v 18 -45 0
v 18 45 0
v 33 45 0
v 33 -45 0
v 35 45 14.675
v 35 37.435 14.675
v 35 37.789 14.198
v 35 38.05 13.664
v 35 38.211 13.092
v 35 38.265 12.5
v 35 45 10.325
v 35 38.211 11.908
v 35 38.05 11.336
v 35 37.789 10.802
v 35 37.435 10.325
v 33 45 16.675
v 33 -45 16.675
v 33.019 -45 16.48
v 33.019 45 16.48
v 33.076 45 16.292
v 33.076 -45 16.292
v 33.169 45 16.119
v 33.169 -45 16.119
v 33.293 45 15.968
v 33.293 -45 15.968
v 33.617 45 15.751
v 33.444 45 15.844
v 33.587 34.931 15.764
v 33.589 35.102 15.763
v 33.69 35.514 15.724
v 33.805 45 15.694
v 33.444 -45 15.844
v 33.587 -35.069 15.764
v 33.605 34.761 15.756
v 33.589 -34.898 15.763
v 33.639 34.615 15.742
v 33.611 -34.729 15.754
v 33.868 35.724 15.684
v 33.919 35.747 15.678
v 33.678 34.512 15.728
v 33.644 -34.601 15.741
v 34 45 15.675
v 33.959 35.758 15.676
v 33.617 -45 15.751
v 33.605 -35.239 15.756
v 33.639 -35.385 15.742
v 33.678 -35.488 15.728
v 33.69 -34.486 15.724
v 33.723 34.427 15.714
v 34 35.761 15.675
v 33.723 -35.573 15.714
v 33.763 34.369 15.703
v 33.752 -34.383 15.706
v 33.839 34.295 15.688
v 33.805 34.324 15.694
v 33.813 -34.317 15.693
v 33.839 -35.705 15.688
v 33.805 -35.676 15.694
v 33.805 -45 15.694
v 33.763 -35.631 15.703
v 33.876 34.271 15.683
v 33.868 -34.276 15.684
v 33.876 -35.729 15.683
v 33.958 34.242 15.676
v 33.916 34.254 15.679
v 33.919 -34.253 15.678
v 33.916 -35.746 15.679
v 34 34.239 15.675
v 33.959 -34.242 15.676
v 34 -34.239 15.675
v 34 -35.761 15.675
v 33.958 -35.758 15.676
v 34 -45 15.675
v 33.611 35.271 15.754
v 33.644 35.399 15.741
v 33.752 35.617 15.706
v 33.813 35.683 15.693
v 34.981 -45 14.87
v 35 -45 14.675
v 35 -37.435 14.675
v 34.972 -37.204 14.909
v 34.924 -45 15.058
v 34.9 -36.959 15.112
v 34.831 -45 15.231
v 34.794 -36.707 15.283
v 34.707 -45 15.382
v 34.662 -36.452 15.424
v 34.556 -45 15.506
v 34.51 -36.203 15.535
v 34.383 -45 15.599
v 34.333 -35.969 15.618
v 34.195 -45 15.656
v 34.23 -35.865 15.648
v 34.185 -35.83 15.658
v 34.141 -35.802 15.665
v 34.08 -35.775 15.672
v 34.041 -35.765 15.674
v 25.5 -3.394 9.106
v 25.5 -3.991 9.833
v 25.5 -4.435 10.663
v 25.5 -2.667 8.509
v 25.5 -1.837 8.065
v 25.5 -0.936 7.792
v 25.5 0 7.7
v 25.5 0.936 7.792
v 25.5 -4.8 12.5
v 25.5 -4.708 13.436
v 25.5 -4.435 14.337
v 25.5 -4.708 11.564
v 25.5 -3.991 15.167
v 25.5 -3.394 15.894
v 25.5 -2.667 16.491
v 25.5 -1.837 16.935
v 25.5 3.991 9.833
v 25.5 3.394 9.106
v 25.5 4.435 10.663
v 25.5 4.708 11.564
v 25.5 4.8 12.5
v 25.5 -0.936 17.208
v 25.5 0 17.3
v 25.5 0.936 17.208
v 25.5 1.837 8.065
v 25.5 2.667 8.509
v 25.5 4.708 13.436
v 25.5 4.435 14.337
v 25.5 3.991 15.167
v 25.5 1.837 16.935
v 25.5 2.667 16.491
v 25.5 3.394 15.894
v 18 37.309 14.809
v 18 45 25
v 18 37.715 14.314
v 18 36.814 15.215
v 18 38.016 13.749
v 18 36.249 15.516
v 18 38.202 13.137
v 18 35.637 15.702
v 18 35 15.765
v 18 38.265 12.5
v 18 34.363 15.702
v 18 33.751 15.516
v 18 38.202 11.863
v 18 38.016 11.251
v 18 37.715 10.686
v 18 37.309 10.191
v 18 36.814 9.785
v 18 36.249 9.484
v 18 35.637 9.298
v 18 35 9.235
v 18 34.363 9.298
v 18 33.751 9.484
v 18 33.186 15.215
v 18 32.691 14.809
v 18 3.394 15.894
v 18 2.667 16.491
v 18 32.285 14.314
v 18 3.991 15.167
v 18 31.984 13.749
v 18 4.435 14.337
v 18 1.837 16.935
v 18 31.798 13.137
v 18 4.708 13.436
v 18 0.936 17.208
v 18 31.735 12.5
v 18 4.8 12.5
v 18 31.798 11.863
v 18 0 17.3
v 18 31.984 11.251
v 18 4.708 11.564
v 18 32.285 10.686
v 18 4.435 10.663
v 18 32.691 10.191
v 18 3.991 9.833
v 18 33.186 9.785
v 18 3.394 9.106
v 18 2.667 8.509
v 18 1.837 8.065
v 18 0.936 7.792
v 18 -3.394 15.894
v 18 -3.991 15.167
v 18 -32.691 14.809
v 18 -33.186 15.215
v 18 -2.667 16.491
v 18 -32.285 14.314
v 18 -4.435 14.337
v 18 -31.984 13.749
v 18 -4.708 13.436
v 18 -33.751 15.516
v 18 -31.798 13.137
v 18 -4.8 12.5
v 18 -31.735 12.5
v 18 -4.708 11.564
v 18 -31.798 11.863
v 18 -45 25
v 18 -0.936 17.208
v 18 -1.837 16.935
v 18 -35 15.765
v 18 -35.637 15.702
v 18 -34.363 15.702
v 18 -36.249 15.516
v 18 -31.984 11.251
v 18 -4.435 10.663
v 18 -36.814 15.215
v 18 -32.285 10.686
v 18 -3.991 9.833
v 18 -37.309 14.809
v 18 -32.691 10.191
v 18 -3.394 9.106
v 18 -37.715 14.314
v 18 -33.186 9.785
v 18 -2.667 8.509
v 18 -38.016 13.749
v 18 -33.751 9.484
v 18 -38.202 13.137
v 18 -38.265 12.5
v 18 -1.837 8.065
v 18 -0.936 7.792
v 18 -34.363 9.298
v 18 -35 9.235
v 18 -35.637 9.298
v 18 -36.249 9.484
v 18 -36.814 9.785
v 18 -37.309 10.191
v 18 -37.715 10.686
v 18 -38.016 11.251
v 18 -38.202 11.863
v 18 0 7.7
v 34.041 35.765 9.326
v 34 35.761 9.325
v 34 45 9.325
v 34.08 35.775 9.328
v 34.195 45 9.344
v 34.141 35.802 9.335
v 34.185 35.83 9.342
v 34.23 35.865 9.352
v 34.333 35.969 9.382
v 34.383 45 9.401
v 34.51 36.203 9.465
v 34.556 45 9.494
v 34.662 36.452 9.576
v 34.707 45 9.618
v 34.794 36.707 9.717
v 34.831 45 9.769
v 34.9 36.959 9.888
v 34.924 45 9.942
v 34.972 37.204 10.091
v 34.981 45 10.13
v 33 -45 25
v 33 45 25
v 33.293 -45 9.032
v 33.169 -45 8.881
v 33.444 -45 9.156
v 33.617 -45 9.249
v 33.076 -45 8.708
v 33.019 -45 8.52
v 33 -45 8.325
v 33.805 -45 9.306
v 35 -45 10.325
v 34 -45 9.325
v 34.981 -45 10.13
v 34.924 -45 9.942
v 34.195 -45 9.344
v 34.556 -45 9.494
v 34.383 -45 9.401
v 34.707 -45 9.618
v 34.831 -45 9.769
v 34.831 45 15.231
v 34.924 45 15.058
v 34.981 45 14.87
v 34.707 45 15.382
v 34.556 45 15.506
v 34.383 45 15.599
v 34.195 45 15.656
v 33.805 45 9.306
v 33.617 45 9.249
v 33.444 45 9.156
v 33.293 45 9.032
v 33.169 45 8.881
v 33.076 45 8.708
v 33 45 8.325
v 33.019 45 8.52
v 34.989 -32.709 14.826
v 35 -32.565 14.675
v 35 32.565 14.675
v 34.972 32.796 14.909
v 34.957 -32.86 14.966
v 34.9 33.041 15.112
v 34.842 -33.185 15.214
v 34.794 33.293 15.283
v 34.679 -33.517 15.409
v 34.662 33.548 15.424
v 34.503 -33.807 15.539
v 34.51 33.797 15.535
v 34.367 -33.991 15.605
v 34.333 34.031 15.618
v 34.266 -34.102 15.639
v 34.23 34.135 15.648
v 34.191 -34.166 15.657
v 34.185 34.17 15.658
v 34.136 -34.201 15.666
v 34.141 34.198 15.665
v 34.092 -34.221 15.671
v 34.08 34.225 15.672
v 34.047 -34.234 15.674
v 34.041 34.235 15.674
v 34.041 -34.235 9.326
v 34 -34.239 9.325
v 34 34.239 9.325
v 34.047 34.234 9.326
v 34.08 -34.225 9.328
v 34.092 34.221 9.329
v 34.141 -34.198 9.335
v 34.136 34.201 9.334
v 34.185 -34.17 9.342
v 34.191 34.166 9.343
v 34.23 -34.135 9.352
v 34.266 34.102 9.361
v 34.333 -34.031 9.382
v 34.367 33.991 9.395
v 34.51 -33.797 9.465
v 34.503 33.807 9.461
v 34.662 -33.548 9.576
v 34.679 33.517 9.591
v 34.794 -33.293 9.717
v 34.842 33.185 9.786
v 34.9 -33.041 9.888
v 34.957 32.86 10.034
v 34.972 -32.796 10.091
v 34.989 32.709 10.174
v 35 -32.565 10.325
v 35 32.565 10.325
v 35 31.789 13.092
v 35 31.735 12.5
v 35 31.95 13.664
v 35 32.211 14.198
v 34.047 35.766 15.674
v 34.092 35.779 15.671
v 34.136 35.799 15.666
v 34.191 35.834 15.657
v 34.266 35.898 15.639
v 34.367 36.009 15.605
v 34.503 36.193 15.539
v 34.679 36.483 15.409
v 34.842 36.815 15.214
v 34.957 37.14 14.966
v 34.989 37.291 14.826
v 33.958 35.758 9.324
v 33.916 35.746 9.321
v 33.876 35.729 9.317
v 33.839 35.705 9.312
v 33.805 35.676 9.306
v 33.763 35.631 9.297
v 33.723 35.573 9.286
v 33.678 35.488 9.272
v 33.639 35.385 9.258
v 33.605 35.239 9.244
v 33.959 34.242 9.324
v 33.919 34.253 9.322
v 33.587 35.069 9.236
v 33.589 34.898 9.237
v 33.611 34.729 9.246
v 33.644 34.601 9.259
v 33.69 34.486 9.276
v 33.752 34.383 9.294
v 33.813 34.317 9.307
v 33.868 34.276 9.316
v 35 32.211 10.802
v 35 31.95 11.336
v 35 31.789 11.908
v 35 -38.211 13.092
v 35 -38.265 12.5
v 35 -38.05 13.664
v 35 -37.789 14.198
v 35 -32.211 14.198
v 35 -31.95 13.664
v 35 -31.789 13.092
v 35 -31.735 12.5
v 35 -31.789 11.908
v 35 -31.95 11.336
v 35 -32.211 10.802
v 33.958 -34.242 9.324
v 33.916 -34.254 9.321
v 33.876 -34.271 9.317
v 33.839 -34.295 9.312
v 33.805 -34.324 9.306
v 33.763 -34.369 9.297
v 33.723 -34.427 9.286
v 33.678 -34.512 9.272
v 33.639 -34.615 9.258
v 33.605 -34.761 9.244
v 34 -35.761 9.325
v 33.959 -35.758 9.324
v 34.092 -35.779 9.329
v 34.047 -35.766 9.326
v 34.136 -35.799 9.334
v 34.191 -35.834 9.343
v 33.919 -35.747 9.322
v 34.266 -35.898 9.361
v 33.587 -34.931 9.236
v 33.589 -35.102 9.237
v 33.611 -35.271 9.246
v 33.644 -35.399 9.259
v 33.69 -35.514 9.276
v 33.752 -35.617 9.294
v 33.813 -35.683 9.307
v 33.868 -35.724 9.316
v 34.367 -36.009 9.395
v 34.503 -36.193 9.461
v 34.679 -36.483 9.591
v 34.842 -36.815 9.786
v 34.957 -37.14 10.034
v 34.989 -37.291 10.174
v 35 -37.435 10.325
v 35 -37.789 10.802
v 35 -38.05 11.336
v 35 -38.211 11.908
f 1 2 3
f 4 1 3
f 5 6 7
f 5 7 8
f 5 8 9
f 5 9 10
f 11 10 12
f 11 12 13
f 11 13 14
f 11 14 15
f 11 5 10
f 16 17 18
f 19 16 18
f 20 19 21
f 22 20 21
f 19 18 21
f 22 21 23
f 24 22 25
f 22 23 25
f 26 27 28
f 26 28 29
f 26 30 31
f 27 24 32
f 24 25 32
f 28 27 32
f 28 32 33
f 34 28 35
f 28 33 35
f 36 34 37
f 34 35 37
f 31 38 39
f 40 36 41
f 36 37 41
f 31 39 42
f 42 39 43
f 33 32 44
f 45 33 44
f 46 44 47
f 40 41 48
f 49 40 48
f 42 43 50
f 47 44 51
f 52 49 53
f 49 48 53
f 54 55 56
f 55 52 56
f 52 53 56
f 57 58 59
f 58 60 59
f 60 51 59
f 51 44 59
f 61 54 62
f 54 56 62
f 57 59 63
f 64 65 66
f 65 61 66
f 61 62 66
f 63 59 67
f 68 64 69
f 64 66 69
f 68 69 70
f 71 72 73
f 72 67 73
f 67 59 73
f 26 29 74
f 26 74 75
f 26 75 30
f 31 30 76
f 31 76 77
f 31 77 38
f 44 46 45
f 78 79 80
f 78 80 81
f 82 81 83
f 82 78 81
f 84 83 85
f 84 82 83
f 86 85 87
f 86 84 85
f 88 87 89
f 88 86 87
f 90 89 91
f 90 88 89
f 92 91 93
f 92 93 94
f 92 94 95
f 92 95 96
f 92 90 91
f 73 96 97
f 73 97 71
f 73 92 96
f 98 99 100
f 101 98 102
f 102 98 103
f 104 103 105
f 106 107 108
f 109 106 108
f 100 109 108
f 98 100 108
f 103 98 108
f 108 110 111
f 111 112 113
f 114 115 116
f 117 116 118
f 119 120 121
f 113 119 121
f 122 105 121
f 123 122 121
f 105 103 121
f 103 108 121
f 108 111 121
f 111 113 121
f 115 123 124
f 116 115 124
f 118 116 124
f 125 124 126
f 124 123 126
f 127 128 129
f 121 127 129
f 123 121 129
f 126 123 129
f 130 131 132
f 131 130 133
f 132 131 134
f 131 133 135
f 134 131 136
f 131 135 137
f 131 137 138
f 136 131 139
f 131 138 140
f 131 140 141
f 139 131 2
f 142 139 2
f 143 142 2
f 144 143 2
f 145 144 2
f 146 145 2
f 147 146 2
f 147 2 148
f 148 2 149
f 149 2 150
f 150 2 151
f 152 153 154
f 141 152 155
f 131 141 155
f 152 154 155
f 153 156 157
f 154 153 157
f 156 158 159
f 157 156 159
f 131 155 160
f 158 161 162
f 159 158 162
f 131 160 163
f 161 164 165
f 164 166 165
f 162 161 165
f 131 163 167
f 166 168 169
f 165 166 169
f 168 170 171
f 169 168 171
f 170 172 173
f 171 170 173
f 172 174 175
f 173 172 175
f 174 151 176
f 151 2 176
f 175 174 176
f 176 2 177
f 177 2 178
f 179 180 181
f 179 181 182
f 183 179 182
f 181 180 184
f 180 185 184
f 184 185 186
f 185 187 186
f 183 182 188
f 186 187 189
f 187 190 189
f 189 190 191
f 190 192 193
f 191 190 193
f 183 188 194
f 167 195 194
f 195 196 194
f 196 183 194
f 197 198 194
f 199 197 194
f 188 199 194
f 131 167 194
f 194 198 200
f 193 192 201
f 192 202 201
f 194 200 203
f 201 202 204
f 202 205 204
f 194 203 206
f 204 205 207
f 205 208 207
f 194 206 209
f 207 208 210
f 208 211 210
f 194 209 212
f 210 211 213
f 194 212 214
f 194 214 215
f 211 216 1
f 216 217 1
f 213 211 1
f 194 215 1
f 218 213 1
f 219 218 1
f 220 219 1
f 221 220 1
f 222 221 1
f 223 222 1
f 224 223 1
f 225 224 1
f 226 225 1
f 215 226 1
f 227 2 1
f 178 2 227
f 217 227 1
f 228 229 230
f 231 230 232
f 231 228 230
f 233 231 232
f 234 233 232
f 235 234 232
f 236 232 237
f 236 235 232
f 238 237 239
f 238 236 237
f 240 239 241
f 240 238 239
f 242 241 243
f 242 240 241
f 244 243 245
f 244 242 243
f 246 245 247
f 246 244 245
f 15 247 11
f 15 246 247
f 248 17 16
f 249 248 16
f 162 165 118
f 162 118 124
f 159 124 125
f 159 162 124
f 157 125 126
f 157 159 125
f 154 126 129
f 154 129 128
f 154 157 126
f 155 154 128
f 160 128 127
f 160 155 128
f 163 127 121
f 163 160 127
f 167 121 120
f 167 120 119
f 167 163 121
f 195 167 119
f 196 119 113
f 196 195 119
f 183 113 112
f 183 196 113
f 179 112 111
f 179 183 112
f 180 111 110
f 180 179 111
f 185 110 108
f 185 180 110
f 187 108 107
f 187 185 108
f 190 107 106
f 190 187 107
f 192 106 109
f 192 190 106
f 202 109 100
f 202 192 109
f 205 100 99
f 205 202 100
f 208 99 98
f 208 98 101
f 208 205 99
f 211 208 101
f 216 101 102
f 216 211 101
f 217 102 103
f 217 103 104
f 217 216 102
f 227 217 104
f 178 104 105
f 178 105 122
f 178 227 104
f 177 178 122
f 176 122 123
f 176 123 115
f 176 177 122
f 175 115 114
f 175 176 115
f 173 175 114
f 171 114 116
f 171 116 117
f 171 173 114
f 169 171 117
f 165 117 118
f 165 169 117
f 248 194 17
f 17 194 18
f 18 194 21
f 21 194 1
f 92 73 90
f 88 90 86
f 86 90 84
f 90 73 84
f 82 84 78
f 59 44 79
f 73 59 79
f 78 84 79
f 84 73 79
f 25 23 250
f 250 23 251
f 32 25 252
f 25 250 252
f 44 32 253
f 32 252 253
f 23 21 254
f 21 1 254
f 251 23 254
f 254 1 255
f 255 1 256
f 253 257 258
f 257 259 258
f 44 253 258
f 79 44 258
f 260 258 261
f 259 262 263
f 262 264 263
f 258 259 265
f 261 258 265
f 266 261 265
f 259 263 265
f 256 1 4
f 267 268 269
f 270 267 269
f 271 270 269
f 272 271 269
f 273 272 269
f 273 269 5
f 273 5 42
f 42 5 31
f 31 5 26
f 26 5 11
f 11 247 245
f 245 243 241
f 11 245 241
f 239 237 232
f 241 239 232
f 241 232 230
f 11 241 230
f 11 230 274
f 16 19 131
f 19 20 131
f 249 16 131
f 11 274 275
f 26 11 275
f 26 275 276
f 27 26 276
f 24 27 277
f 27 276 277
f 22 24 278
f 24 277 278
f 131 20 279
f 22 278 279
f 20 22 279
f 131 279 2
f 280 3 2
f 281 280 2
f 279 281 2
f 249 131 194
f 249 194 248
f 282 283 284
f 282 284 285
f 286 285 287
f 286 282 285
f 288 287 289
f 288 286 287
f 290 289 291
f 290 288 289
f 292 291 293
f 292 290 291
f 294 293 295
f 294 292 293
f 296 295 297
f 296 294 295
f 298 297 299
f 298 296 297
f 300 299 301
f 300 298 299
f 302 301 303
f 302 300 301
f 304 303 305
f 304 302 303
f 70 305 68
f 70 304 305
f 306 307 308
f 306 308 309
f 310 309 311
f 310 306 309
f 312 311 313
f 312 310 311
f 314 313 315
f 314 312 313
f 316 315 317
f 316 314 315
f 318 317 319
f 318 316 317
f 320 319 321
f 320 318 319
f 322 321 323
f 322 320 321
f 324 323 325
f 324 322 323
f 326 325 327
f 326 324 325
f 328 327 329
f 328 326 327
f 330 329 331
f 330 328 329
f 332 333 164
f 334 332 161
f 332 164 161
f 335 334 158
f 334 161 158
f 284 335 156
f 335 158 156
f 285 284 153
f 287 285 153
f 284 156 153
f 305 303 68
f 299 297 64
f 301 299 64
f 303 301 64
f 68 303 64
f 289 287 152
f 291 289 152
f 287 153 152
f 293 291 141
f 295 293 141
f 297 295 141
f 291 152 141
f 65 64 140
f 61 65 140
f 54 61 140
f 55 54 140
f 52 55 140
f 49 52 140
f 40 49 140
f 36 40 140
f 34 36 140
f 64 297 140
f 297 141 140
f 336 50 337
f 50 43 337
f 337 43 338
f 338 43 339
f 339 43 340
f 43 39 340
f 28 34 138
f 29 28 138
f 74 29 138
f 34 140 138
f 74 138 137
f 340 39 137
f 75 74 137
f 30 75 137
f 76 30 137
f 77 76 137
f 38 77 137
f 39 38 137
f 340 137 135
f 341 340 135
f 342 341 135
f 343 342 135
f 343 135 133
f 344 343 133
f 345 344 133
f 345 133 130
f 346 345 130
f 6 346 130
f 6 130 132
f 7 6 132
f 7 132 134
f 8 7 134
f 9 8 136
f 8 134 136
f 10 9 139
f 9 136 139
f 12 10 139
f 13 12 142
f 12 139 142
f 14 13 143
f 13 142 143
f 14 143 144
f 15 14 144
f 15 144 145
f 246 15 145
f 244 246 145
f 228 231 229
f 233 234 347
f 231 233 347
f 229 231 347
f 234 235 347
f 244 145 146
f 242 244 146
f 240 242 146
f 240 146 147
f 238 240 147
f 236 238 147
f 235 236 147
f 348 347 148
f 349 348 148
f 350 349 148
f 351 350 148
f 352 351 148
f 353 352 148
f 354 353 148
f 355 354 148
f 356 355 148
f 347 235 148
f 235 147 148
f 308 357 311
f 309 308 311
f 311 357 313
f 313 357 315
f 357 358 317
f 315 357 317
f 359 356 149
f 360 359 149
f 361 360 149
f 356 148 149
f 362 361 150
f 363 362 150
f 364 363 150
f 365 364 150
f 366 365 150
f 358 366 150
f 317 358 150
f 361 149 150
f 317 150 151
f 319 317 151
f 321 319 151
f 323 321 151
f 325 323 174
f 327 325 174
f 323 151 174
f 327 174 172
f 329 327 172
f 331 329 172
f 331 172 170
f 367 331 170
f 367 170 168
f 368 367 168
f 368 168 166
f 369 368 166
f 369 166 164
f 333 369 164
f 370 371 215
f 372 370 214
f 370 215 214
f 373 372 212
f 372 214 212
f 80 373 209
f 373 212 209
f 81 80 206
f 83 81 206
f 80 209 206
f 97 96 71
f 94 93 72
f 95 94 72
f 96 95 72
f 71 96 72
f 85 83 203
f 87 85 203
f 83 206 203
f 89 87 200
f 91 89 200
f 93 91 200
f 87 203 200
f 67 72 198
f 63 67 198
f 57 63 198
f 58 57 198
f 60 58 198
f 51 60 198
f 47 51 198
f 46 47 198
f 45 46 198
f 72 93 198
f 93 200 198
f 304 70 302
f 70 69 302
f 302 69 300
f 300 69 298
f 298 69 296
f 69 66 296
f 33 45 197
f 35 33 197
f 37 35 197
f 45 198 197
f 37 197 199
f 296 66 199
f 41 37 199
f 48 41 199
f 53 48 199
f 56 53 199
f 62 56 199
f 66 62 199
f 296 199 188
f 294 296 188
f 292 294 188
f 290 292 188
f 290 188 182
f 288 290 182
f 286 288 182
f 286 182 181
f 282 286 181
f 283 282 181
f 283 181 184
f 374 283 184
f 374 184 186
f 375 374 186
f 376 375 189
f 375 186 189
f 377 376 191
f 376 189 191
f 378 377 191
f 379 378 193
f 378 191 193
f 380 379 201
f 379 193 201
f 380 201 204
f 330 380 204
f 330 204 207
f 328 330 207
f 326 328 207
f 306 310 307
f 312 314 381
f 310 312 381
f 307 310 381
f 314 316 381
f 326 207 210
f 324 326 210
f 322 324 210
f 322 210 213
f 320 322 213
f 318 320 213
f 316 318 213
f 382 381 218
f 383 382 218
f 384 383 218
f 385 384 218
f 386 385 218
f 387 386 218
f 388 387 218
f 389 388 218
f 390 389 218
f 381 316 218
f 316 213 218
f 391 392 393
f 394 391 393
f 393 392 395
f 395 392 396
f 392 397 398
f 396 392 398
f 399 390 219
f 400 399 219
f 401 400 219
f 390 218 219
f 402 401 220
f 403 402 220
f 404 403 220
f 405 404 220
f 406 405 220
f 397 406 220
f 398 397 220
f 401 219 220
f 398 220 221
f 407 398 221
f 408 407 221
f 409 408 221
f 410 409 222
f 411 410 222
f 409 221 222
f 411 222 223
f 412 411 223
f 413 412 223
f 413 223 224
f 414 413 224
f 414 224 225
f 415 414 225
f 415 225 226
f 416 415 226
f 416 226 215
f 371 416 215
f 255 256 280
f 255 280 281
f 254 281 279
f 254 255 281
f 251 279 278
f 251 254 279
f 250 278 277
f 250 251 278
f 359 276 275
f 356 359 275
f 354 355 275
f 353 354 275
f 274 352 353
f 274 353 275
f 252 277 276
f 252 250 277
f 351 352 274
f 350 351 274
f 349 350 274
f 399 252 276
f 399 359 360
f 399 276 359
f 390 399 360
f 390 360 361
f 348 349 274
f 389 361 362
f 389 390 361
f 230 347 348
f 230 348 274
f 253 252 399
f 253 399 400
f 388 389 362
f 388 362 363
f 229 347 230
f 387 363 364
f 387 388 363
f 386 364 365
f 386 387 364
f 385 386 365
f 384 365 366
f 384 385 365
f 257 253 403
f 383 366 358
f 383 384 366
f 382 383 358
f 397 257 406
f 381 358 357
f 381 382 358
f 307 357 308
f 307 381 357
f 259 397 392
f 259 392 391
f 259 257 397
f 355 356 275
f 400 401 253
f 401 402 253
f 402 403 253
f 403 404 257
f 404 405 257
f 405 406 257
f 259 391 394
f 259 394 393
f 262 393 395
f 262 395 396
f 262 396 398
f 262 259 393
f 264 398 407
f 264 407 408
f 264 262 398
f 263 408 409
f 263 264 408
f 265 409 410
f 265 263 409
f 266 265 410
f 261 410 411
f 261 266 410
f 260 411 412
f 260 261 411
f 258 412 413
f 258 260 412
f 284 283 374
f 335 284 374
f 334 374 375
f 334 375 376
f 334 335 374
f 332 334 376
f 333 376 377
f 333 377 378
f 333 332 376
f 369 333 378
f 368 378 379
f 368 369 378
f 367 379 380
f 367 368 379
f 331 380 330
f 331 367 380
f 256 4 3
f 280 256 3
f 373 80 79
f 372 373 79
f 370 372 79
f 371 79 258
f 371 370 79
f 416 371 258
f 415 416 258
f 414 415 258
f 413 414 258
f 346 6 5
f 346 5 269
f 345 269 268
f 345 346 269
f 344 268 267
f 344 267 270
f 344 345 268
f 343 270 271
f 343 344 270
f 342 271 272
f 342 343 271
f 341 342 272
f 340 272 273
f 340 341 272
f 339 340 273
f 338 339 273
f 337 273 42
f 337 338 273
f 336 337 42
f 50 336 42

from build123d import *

# Parameters (mm, degrees)
BOSS_EXTRUDE1_DEPTH = 25
SKETCH3_R           = 4.8
CUT_EXTRUDE1_DEPTH  = 7.5
SKETCH6_W           = 2
SKETCH6_H           = 6.35
BOSS_EXTRUDE2_DEPTH = 90
FILLET2_R           = 1
SKETCH7_R           = 3.265
CUT_EXTRUDE2_DEPTH  = 55.212544674


with BuildPart() as part:
    # Sketch2 → Boss-Extrude1 (new body)
    with BuildSketch(Plane.XY):
        Polygon((18, 45), (18, 25), (18, -25), (18, -45), (33, -45), (33, 45), align=None)
    extrude(amount=BOSS_EXTRUDE1_DEPTH)

    # Sketch3 → Cut-Extrude1 (cut)
    with BuildSketch(Plane(origin=(18, 0, 0), x_dir=(0, 0, -1), z_dir=(1, 0, 0))):
        with Locations(Location((-12.5, 0, 0), (0, 0, 90))):
            Circle(SKETCH3_R)
    extrude(amount=CUT_EXTRUDE1_DEPTH, mode=Mode.SUBTRACT)

    # Sketch6 → Boss-Extrude2 (add, through all)
    with BuildSketch(Plane(origin=(0, 45, 0), x_dir=(1, 0, 0), z_dir=(0, 1, 0))):
        with Locations((34, -12.5)):
            Rectangle(SKETCH6_W, SKETCH6_H)
    extrude(amount=-BOSS_EXTRUDE2_DEPTH)

    # Fillet2
    fillet2_edges = [part.edges().sort_by_distance(p)[0] for p in [
        (33, 0, 9.325),
        (33, 0, 15.675),
    ]]
    fillet(fillet2_edges, radius=FILLET2_R)
    fillet2_2_edges = [part.edges().sort_by_distance(p)[0] for p in [
        (35, 0, 9.325),
        (35, 0, 15.675),
    ]]
    fillet(fillet2_2_edges, radius=FILLET2_R - 0.0001)  # a hair under: the kernel refuses the full size

    # Sketch7 → Cut-Extrude2 (cut, through all)
    with BuildSketch(Plane.ZY.offset(-18)):
        with Locations(Location((12.5, 35, 0), (0, 0, 270))):
            Circle(SKETCH7_R)
        with Locations(Location((12.5, -35, 0), (0, 0, 270))):
            Circle(SKETCH7_R)
    extrude(amount=-CUT_EXTRUDE2_DEPTH, mode=Mode.SUBTRACT)


solid = part.part
